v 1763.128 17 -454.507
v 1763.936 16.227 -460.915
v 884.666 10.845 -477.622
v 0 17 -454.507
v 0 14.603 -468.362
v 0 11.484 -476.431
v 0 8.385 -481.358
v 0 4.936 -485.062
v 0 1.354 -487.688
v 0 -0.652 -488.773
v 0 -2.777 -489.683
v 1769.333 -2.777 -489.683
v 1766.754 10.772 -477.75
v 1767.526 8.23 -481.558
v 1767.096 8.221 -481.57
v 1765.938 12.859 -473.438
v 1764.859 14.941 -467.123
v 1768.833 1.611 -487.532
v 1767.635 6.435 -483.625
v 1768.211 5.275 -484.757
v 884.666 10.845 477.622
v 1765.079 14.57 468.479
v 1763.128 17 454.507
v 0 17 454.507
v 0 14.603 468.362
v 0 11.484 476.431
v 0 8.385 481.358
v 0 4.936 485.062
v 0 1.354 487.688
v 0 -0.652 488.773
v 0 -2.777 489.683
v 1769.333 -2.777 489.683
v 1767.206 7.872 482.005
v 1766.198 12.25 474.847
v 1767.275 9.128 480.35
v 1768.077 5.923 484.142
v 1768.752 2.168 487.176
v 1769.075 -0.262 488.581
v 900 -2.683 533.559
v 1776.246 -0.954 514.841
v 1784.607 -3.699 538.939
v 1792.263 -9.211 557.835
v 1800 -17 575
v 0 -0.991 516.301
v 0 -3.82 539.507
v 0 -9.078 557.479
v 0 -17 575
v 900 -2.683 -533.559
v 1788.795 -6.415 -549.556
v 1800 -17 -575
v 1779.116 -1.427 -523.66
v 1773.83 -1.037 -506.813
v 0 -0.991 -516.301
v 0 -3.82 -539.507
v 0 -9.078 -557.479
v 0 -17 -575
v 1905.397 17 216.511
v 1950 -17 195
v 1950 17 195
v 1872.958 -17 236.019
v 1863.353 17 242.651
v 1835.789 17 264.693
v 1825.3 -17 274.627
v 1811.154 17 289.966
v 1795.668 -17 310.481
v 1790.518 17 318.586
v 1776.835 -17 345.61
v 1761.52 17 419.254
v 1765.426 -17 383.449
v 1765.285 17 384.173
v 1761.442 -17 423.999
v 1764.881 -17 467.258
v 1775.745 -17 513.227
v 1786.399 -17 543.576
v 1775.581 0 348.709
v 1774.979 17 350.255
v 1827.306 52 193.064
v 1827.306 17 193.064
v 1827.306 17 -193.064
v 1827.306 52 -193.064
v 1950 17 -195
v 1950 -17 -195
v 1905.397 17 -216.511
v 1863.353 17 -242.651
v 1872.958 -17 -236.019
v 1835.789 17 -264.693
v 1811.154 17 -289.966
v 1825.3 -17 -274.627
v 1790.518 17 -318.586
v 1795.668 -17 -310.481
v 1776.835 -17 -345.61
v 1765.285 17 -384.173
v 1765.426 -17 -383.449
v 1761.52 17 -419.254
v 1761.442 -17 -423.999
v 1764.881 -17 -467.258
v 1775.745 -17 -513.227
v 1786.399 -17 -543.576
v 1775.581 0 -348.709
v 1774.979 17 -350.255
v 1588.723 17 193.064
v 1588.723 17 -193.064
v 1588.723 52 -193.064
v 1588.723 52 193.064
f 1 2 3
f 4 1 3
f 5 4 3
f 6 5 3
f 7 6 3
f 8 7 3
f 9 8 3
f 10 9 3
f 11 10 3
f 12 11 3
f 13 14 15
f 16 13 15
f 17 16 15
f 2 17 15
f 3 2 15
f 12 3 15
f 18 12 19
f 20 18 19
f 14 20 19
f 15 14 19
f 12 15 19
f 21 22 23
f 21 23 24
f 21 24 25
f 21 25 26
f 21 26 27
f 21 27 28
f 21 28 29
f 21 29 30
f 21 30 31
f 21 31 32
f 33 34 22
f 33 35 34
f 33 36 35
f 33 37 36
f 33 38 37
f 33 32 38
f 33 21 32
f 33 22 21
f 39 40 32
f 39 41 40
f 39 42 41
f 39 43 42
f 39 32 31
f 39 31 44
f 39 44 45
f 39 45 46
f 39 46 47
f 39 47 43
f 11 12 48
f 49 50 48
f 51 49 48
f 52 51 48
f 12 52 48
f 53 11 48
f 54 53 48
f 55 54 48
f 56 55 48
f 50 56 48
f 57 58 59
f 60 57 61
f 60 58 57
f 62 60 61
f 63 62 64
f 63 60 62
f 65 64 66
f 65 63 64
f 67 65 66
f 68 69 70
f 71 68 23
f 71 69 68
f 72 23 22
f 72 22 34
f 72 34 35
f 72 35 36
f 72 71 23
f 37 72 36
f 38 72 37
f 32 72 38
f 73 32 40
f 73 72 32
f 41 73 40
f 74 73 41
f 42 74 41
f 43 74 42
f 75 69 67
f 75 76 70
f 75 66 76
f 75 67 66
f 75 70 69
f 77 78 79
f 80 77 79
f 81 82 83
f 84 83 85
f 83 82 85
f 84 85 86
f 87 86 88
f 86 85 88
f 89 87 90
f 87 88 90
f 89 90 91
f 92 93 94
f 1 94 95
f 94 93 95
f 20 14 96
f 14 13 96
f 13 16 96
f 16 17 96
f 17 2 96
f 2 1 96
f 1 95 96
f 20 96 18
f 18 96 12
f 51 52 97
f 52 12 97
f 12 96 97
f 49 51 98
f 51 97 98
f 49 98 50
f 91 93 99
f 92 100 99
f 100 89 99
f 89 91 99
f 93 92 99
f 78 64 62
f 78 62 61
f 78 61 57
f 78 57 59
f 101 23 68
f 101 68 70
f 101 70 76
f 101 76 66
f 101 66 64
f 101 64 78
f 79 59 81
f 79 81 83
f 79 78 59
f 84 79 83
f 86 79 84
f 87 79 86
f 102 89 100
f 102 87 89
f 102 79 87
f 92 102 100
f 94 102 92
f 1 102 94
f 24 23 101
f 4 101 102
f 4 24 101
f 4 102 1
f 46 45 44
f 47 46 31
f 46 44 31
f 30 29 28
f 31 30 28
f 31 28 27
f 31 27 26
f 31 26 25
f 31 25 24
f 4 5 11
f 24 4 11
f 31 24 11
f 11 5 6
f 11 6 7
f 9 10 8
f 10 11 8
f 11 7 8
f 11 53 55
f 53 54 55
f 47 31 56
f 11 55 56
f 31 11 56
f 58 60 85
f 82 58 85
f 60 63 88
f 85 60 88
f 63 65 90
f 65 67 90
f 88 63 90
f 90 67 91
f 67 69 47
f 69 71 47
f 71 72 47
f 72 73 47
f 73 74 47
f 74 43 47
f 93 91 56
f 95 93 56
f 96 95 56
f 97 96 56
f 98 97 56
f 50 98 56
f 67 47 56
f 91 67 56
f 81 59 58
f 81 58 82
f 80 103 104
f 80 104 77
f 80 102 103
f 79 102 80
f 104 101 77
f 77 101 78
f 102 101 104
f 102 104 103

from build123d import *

# Parameters (mm, degrees)
SKETCH1_W           = 1150
SKETCH1_H           = 34
BOSS_EXTRUDE1_DEPTH = 1950
CUT_EXTRUDE3_DEPTH  = 1950
CUT_EXTRUDE4_DEPTH  = 1950
SKETCH4_W           = 238.582936687
SKETCH4_H           = 386.127647534
BOSS_EXTRUDE5_DEPTH = 35


with BuildPart() as part:
    # Sketch1 → Boss-Extrude1 (new body)
    with BuildSketch(Plane(origin=(0, 0, 0), x_dir=(0, 0, -1), z_dir=(1, 0, 0))):
        Rectangle(SKETCH1_W, SKETCH1_H)
    extrude(amount=BOSS_EXTRUDE1_DEPTH)

    # Sketch2 → Cut-Extrude3 (cut)
    with BuildSketch(Plane(origin=(1950, 0, 0), x_dir=(0, 0, -1), z_dir=(1, 0, 0))):
        with BuildLine():
            Line((454.506922221, 17), (575, 17))
            Line((575, 17), (575, -17))
            add(Edge.make_bspline(
                [(489.682610702, -2.777028038), (534.776362322, 4.522431825), (575, -17)],
                knots=[0, 0, 0, 1, 1, 1], degree=2))
            add(Edge.make_bspline(
                [(454.506922221, 17), (483.149171875, 14.577610521), (489.682610702, -2.777028038)],
                knots=[0, 0, 0, 0.737774991, 0.737774991, 0.737774991], degree=2))
        make_face()
        with BuildLine():
            Line((-454.506922221, 17), (-575, 17))
            Line((-575, 17), (-575, -17))
            add(Edge.make_bspline(
                [(-489.682610702, -2.777028038), (-534.776362322, 4.522431825), (-575, -17)],
                knots=[0, 0, 0, 1, 1, 1], degree=2))
            add(Edge.make_bspline(
                [(-454.506922221, 17), (-483.149171875, 14.577610521), (-489.682610702, -2.777028038)],
                knots=[0, 0, 0, 0.737774991, 0.737774991, 0.737774991], degree=2))
        make_face()
    extrude(amount=-CUT_EXTRUDE3_DEPTH, mode=Mode.SUBTRACT)

    # Sketch3 → Cut-Extrude4 (cut)
    with BuildSketch(Plane.XZ.offset(17)):
        with BuildLine():
            Line((1800, 575), (1950, 575))
            Line((1950, 575), (1950, 195))
            add(Edge.make_bspline(
                [(1950, 195), (1676.162586963, 312.417807061), (1800, 575)],
                knots=[0, 0, 0, 1, 1, 1], degree=2))
        make_face()
        with BuildLine():
            Line((1950, -195), (1950, -575))
            Line((1950, -575), (1800, -575))
            add(Edge.make_bspline(
                [(1950, -195), (1676.162586963, -312.417807061), (1800, -575)],
                knots=[0, 0, 0, 1, 1, 1], degree=2))
        make_face()
    extrude(amount=-CUT_EXTRUDE4_DEPTH, mode=Mode.SUBTRACT)

    # Sketch4 → Boss-Extrude5 (add)
    with BuildSketch(Plane(origin=(0, 17, 0), x_dir=(1, 0, 0), z_dir=(0, 1, 0))):
        with Locations((1708.01468048, 0)):
            Rectangle(SKETCH4_W, SKETCH4_H)
    extrude(amount=BOSS_EXTRUDE5_DEPTH)


solid = part.part
